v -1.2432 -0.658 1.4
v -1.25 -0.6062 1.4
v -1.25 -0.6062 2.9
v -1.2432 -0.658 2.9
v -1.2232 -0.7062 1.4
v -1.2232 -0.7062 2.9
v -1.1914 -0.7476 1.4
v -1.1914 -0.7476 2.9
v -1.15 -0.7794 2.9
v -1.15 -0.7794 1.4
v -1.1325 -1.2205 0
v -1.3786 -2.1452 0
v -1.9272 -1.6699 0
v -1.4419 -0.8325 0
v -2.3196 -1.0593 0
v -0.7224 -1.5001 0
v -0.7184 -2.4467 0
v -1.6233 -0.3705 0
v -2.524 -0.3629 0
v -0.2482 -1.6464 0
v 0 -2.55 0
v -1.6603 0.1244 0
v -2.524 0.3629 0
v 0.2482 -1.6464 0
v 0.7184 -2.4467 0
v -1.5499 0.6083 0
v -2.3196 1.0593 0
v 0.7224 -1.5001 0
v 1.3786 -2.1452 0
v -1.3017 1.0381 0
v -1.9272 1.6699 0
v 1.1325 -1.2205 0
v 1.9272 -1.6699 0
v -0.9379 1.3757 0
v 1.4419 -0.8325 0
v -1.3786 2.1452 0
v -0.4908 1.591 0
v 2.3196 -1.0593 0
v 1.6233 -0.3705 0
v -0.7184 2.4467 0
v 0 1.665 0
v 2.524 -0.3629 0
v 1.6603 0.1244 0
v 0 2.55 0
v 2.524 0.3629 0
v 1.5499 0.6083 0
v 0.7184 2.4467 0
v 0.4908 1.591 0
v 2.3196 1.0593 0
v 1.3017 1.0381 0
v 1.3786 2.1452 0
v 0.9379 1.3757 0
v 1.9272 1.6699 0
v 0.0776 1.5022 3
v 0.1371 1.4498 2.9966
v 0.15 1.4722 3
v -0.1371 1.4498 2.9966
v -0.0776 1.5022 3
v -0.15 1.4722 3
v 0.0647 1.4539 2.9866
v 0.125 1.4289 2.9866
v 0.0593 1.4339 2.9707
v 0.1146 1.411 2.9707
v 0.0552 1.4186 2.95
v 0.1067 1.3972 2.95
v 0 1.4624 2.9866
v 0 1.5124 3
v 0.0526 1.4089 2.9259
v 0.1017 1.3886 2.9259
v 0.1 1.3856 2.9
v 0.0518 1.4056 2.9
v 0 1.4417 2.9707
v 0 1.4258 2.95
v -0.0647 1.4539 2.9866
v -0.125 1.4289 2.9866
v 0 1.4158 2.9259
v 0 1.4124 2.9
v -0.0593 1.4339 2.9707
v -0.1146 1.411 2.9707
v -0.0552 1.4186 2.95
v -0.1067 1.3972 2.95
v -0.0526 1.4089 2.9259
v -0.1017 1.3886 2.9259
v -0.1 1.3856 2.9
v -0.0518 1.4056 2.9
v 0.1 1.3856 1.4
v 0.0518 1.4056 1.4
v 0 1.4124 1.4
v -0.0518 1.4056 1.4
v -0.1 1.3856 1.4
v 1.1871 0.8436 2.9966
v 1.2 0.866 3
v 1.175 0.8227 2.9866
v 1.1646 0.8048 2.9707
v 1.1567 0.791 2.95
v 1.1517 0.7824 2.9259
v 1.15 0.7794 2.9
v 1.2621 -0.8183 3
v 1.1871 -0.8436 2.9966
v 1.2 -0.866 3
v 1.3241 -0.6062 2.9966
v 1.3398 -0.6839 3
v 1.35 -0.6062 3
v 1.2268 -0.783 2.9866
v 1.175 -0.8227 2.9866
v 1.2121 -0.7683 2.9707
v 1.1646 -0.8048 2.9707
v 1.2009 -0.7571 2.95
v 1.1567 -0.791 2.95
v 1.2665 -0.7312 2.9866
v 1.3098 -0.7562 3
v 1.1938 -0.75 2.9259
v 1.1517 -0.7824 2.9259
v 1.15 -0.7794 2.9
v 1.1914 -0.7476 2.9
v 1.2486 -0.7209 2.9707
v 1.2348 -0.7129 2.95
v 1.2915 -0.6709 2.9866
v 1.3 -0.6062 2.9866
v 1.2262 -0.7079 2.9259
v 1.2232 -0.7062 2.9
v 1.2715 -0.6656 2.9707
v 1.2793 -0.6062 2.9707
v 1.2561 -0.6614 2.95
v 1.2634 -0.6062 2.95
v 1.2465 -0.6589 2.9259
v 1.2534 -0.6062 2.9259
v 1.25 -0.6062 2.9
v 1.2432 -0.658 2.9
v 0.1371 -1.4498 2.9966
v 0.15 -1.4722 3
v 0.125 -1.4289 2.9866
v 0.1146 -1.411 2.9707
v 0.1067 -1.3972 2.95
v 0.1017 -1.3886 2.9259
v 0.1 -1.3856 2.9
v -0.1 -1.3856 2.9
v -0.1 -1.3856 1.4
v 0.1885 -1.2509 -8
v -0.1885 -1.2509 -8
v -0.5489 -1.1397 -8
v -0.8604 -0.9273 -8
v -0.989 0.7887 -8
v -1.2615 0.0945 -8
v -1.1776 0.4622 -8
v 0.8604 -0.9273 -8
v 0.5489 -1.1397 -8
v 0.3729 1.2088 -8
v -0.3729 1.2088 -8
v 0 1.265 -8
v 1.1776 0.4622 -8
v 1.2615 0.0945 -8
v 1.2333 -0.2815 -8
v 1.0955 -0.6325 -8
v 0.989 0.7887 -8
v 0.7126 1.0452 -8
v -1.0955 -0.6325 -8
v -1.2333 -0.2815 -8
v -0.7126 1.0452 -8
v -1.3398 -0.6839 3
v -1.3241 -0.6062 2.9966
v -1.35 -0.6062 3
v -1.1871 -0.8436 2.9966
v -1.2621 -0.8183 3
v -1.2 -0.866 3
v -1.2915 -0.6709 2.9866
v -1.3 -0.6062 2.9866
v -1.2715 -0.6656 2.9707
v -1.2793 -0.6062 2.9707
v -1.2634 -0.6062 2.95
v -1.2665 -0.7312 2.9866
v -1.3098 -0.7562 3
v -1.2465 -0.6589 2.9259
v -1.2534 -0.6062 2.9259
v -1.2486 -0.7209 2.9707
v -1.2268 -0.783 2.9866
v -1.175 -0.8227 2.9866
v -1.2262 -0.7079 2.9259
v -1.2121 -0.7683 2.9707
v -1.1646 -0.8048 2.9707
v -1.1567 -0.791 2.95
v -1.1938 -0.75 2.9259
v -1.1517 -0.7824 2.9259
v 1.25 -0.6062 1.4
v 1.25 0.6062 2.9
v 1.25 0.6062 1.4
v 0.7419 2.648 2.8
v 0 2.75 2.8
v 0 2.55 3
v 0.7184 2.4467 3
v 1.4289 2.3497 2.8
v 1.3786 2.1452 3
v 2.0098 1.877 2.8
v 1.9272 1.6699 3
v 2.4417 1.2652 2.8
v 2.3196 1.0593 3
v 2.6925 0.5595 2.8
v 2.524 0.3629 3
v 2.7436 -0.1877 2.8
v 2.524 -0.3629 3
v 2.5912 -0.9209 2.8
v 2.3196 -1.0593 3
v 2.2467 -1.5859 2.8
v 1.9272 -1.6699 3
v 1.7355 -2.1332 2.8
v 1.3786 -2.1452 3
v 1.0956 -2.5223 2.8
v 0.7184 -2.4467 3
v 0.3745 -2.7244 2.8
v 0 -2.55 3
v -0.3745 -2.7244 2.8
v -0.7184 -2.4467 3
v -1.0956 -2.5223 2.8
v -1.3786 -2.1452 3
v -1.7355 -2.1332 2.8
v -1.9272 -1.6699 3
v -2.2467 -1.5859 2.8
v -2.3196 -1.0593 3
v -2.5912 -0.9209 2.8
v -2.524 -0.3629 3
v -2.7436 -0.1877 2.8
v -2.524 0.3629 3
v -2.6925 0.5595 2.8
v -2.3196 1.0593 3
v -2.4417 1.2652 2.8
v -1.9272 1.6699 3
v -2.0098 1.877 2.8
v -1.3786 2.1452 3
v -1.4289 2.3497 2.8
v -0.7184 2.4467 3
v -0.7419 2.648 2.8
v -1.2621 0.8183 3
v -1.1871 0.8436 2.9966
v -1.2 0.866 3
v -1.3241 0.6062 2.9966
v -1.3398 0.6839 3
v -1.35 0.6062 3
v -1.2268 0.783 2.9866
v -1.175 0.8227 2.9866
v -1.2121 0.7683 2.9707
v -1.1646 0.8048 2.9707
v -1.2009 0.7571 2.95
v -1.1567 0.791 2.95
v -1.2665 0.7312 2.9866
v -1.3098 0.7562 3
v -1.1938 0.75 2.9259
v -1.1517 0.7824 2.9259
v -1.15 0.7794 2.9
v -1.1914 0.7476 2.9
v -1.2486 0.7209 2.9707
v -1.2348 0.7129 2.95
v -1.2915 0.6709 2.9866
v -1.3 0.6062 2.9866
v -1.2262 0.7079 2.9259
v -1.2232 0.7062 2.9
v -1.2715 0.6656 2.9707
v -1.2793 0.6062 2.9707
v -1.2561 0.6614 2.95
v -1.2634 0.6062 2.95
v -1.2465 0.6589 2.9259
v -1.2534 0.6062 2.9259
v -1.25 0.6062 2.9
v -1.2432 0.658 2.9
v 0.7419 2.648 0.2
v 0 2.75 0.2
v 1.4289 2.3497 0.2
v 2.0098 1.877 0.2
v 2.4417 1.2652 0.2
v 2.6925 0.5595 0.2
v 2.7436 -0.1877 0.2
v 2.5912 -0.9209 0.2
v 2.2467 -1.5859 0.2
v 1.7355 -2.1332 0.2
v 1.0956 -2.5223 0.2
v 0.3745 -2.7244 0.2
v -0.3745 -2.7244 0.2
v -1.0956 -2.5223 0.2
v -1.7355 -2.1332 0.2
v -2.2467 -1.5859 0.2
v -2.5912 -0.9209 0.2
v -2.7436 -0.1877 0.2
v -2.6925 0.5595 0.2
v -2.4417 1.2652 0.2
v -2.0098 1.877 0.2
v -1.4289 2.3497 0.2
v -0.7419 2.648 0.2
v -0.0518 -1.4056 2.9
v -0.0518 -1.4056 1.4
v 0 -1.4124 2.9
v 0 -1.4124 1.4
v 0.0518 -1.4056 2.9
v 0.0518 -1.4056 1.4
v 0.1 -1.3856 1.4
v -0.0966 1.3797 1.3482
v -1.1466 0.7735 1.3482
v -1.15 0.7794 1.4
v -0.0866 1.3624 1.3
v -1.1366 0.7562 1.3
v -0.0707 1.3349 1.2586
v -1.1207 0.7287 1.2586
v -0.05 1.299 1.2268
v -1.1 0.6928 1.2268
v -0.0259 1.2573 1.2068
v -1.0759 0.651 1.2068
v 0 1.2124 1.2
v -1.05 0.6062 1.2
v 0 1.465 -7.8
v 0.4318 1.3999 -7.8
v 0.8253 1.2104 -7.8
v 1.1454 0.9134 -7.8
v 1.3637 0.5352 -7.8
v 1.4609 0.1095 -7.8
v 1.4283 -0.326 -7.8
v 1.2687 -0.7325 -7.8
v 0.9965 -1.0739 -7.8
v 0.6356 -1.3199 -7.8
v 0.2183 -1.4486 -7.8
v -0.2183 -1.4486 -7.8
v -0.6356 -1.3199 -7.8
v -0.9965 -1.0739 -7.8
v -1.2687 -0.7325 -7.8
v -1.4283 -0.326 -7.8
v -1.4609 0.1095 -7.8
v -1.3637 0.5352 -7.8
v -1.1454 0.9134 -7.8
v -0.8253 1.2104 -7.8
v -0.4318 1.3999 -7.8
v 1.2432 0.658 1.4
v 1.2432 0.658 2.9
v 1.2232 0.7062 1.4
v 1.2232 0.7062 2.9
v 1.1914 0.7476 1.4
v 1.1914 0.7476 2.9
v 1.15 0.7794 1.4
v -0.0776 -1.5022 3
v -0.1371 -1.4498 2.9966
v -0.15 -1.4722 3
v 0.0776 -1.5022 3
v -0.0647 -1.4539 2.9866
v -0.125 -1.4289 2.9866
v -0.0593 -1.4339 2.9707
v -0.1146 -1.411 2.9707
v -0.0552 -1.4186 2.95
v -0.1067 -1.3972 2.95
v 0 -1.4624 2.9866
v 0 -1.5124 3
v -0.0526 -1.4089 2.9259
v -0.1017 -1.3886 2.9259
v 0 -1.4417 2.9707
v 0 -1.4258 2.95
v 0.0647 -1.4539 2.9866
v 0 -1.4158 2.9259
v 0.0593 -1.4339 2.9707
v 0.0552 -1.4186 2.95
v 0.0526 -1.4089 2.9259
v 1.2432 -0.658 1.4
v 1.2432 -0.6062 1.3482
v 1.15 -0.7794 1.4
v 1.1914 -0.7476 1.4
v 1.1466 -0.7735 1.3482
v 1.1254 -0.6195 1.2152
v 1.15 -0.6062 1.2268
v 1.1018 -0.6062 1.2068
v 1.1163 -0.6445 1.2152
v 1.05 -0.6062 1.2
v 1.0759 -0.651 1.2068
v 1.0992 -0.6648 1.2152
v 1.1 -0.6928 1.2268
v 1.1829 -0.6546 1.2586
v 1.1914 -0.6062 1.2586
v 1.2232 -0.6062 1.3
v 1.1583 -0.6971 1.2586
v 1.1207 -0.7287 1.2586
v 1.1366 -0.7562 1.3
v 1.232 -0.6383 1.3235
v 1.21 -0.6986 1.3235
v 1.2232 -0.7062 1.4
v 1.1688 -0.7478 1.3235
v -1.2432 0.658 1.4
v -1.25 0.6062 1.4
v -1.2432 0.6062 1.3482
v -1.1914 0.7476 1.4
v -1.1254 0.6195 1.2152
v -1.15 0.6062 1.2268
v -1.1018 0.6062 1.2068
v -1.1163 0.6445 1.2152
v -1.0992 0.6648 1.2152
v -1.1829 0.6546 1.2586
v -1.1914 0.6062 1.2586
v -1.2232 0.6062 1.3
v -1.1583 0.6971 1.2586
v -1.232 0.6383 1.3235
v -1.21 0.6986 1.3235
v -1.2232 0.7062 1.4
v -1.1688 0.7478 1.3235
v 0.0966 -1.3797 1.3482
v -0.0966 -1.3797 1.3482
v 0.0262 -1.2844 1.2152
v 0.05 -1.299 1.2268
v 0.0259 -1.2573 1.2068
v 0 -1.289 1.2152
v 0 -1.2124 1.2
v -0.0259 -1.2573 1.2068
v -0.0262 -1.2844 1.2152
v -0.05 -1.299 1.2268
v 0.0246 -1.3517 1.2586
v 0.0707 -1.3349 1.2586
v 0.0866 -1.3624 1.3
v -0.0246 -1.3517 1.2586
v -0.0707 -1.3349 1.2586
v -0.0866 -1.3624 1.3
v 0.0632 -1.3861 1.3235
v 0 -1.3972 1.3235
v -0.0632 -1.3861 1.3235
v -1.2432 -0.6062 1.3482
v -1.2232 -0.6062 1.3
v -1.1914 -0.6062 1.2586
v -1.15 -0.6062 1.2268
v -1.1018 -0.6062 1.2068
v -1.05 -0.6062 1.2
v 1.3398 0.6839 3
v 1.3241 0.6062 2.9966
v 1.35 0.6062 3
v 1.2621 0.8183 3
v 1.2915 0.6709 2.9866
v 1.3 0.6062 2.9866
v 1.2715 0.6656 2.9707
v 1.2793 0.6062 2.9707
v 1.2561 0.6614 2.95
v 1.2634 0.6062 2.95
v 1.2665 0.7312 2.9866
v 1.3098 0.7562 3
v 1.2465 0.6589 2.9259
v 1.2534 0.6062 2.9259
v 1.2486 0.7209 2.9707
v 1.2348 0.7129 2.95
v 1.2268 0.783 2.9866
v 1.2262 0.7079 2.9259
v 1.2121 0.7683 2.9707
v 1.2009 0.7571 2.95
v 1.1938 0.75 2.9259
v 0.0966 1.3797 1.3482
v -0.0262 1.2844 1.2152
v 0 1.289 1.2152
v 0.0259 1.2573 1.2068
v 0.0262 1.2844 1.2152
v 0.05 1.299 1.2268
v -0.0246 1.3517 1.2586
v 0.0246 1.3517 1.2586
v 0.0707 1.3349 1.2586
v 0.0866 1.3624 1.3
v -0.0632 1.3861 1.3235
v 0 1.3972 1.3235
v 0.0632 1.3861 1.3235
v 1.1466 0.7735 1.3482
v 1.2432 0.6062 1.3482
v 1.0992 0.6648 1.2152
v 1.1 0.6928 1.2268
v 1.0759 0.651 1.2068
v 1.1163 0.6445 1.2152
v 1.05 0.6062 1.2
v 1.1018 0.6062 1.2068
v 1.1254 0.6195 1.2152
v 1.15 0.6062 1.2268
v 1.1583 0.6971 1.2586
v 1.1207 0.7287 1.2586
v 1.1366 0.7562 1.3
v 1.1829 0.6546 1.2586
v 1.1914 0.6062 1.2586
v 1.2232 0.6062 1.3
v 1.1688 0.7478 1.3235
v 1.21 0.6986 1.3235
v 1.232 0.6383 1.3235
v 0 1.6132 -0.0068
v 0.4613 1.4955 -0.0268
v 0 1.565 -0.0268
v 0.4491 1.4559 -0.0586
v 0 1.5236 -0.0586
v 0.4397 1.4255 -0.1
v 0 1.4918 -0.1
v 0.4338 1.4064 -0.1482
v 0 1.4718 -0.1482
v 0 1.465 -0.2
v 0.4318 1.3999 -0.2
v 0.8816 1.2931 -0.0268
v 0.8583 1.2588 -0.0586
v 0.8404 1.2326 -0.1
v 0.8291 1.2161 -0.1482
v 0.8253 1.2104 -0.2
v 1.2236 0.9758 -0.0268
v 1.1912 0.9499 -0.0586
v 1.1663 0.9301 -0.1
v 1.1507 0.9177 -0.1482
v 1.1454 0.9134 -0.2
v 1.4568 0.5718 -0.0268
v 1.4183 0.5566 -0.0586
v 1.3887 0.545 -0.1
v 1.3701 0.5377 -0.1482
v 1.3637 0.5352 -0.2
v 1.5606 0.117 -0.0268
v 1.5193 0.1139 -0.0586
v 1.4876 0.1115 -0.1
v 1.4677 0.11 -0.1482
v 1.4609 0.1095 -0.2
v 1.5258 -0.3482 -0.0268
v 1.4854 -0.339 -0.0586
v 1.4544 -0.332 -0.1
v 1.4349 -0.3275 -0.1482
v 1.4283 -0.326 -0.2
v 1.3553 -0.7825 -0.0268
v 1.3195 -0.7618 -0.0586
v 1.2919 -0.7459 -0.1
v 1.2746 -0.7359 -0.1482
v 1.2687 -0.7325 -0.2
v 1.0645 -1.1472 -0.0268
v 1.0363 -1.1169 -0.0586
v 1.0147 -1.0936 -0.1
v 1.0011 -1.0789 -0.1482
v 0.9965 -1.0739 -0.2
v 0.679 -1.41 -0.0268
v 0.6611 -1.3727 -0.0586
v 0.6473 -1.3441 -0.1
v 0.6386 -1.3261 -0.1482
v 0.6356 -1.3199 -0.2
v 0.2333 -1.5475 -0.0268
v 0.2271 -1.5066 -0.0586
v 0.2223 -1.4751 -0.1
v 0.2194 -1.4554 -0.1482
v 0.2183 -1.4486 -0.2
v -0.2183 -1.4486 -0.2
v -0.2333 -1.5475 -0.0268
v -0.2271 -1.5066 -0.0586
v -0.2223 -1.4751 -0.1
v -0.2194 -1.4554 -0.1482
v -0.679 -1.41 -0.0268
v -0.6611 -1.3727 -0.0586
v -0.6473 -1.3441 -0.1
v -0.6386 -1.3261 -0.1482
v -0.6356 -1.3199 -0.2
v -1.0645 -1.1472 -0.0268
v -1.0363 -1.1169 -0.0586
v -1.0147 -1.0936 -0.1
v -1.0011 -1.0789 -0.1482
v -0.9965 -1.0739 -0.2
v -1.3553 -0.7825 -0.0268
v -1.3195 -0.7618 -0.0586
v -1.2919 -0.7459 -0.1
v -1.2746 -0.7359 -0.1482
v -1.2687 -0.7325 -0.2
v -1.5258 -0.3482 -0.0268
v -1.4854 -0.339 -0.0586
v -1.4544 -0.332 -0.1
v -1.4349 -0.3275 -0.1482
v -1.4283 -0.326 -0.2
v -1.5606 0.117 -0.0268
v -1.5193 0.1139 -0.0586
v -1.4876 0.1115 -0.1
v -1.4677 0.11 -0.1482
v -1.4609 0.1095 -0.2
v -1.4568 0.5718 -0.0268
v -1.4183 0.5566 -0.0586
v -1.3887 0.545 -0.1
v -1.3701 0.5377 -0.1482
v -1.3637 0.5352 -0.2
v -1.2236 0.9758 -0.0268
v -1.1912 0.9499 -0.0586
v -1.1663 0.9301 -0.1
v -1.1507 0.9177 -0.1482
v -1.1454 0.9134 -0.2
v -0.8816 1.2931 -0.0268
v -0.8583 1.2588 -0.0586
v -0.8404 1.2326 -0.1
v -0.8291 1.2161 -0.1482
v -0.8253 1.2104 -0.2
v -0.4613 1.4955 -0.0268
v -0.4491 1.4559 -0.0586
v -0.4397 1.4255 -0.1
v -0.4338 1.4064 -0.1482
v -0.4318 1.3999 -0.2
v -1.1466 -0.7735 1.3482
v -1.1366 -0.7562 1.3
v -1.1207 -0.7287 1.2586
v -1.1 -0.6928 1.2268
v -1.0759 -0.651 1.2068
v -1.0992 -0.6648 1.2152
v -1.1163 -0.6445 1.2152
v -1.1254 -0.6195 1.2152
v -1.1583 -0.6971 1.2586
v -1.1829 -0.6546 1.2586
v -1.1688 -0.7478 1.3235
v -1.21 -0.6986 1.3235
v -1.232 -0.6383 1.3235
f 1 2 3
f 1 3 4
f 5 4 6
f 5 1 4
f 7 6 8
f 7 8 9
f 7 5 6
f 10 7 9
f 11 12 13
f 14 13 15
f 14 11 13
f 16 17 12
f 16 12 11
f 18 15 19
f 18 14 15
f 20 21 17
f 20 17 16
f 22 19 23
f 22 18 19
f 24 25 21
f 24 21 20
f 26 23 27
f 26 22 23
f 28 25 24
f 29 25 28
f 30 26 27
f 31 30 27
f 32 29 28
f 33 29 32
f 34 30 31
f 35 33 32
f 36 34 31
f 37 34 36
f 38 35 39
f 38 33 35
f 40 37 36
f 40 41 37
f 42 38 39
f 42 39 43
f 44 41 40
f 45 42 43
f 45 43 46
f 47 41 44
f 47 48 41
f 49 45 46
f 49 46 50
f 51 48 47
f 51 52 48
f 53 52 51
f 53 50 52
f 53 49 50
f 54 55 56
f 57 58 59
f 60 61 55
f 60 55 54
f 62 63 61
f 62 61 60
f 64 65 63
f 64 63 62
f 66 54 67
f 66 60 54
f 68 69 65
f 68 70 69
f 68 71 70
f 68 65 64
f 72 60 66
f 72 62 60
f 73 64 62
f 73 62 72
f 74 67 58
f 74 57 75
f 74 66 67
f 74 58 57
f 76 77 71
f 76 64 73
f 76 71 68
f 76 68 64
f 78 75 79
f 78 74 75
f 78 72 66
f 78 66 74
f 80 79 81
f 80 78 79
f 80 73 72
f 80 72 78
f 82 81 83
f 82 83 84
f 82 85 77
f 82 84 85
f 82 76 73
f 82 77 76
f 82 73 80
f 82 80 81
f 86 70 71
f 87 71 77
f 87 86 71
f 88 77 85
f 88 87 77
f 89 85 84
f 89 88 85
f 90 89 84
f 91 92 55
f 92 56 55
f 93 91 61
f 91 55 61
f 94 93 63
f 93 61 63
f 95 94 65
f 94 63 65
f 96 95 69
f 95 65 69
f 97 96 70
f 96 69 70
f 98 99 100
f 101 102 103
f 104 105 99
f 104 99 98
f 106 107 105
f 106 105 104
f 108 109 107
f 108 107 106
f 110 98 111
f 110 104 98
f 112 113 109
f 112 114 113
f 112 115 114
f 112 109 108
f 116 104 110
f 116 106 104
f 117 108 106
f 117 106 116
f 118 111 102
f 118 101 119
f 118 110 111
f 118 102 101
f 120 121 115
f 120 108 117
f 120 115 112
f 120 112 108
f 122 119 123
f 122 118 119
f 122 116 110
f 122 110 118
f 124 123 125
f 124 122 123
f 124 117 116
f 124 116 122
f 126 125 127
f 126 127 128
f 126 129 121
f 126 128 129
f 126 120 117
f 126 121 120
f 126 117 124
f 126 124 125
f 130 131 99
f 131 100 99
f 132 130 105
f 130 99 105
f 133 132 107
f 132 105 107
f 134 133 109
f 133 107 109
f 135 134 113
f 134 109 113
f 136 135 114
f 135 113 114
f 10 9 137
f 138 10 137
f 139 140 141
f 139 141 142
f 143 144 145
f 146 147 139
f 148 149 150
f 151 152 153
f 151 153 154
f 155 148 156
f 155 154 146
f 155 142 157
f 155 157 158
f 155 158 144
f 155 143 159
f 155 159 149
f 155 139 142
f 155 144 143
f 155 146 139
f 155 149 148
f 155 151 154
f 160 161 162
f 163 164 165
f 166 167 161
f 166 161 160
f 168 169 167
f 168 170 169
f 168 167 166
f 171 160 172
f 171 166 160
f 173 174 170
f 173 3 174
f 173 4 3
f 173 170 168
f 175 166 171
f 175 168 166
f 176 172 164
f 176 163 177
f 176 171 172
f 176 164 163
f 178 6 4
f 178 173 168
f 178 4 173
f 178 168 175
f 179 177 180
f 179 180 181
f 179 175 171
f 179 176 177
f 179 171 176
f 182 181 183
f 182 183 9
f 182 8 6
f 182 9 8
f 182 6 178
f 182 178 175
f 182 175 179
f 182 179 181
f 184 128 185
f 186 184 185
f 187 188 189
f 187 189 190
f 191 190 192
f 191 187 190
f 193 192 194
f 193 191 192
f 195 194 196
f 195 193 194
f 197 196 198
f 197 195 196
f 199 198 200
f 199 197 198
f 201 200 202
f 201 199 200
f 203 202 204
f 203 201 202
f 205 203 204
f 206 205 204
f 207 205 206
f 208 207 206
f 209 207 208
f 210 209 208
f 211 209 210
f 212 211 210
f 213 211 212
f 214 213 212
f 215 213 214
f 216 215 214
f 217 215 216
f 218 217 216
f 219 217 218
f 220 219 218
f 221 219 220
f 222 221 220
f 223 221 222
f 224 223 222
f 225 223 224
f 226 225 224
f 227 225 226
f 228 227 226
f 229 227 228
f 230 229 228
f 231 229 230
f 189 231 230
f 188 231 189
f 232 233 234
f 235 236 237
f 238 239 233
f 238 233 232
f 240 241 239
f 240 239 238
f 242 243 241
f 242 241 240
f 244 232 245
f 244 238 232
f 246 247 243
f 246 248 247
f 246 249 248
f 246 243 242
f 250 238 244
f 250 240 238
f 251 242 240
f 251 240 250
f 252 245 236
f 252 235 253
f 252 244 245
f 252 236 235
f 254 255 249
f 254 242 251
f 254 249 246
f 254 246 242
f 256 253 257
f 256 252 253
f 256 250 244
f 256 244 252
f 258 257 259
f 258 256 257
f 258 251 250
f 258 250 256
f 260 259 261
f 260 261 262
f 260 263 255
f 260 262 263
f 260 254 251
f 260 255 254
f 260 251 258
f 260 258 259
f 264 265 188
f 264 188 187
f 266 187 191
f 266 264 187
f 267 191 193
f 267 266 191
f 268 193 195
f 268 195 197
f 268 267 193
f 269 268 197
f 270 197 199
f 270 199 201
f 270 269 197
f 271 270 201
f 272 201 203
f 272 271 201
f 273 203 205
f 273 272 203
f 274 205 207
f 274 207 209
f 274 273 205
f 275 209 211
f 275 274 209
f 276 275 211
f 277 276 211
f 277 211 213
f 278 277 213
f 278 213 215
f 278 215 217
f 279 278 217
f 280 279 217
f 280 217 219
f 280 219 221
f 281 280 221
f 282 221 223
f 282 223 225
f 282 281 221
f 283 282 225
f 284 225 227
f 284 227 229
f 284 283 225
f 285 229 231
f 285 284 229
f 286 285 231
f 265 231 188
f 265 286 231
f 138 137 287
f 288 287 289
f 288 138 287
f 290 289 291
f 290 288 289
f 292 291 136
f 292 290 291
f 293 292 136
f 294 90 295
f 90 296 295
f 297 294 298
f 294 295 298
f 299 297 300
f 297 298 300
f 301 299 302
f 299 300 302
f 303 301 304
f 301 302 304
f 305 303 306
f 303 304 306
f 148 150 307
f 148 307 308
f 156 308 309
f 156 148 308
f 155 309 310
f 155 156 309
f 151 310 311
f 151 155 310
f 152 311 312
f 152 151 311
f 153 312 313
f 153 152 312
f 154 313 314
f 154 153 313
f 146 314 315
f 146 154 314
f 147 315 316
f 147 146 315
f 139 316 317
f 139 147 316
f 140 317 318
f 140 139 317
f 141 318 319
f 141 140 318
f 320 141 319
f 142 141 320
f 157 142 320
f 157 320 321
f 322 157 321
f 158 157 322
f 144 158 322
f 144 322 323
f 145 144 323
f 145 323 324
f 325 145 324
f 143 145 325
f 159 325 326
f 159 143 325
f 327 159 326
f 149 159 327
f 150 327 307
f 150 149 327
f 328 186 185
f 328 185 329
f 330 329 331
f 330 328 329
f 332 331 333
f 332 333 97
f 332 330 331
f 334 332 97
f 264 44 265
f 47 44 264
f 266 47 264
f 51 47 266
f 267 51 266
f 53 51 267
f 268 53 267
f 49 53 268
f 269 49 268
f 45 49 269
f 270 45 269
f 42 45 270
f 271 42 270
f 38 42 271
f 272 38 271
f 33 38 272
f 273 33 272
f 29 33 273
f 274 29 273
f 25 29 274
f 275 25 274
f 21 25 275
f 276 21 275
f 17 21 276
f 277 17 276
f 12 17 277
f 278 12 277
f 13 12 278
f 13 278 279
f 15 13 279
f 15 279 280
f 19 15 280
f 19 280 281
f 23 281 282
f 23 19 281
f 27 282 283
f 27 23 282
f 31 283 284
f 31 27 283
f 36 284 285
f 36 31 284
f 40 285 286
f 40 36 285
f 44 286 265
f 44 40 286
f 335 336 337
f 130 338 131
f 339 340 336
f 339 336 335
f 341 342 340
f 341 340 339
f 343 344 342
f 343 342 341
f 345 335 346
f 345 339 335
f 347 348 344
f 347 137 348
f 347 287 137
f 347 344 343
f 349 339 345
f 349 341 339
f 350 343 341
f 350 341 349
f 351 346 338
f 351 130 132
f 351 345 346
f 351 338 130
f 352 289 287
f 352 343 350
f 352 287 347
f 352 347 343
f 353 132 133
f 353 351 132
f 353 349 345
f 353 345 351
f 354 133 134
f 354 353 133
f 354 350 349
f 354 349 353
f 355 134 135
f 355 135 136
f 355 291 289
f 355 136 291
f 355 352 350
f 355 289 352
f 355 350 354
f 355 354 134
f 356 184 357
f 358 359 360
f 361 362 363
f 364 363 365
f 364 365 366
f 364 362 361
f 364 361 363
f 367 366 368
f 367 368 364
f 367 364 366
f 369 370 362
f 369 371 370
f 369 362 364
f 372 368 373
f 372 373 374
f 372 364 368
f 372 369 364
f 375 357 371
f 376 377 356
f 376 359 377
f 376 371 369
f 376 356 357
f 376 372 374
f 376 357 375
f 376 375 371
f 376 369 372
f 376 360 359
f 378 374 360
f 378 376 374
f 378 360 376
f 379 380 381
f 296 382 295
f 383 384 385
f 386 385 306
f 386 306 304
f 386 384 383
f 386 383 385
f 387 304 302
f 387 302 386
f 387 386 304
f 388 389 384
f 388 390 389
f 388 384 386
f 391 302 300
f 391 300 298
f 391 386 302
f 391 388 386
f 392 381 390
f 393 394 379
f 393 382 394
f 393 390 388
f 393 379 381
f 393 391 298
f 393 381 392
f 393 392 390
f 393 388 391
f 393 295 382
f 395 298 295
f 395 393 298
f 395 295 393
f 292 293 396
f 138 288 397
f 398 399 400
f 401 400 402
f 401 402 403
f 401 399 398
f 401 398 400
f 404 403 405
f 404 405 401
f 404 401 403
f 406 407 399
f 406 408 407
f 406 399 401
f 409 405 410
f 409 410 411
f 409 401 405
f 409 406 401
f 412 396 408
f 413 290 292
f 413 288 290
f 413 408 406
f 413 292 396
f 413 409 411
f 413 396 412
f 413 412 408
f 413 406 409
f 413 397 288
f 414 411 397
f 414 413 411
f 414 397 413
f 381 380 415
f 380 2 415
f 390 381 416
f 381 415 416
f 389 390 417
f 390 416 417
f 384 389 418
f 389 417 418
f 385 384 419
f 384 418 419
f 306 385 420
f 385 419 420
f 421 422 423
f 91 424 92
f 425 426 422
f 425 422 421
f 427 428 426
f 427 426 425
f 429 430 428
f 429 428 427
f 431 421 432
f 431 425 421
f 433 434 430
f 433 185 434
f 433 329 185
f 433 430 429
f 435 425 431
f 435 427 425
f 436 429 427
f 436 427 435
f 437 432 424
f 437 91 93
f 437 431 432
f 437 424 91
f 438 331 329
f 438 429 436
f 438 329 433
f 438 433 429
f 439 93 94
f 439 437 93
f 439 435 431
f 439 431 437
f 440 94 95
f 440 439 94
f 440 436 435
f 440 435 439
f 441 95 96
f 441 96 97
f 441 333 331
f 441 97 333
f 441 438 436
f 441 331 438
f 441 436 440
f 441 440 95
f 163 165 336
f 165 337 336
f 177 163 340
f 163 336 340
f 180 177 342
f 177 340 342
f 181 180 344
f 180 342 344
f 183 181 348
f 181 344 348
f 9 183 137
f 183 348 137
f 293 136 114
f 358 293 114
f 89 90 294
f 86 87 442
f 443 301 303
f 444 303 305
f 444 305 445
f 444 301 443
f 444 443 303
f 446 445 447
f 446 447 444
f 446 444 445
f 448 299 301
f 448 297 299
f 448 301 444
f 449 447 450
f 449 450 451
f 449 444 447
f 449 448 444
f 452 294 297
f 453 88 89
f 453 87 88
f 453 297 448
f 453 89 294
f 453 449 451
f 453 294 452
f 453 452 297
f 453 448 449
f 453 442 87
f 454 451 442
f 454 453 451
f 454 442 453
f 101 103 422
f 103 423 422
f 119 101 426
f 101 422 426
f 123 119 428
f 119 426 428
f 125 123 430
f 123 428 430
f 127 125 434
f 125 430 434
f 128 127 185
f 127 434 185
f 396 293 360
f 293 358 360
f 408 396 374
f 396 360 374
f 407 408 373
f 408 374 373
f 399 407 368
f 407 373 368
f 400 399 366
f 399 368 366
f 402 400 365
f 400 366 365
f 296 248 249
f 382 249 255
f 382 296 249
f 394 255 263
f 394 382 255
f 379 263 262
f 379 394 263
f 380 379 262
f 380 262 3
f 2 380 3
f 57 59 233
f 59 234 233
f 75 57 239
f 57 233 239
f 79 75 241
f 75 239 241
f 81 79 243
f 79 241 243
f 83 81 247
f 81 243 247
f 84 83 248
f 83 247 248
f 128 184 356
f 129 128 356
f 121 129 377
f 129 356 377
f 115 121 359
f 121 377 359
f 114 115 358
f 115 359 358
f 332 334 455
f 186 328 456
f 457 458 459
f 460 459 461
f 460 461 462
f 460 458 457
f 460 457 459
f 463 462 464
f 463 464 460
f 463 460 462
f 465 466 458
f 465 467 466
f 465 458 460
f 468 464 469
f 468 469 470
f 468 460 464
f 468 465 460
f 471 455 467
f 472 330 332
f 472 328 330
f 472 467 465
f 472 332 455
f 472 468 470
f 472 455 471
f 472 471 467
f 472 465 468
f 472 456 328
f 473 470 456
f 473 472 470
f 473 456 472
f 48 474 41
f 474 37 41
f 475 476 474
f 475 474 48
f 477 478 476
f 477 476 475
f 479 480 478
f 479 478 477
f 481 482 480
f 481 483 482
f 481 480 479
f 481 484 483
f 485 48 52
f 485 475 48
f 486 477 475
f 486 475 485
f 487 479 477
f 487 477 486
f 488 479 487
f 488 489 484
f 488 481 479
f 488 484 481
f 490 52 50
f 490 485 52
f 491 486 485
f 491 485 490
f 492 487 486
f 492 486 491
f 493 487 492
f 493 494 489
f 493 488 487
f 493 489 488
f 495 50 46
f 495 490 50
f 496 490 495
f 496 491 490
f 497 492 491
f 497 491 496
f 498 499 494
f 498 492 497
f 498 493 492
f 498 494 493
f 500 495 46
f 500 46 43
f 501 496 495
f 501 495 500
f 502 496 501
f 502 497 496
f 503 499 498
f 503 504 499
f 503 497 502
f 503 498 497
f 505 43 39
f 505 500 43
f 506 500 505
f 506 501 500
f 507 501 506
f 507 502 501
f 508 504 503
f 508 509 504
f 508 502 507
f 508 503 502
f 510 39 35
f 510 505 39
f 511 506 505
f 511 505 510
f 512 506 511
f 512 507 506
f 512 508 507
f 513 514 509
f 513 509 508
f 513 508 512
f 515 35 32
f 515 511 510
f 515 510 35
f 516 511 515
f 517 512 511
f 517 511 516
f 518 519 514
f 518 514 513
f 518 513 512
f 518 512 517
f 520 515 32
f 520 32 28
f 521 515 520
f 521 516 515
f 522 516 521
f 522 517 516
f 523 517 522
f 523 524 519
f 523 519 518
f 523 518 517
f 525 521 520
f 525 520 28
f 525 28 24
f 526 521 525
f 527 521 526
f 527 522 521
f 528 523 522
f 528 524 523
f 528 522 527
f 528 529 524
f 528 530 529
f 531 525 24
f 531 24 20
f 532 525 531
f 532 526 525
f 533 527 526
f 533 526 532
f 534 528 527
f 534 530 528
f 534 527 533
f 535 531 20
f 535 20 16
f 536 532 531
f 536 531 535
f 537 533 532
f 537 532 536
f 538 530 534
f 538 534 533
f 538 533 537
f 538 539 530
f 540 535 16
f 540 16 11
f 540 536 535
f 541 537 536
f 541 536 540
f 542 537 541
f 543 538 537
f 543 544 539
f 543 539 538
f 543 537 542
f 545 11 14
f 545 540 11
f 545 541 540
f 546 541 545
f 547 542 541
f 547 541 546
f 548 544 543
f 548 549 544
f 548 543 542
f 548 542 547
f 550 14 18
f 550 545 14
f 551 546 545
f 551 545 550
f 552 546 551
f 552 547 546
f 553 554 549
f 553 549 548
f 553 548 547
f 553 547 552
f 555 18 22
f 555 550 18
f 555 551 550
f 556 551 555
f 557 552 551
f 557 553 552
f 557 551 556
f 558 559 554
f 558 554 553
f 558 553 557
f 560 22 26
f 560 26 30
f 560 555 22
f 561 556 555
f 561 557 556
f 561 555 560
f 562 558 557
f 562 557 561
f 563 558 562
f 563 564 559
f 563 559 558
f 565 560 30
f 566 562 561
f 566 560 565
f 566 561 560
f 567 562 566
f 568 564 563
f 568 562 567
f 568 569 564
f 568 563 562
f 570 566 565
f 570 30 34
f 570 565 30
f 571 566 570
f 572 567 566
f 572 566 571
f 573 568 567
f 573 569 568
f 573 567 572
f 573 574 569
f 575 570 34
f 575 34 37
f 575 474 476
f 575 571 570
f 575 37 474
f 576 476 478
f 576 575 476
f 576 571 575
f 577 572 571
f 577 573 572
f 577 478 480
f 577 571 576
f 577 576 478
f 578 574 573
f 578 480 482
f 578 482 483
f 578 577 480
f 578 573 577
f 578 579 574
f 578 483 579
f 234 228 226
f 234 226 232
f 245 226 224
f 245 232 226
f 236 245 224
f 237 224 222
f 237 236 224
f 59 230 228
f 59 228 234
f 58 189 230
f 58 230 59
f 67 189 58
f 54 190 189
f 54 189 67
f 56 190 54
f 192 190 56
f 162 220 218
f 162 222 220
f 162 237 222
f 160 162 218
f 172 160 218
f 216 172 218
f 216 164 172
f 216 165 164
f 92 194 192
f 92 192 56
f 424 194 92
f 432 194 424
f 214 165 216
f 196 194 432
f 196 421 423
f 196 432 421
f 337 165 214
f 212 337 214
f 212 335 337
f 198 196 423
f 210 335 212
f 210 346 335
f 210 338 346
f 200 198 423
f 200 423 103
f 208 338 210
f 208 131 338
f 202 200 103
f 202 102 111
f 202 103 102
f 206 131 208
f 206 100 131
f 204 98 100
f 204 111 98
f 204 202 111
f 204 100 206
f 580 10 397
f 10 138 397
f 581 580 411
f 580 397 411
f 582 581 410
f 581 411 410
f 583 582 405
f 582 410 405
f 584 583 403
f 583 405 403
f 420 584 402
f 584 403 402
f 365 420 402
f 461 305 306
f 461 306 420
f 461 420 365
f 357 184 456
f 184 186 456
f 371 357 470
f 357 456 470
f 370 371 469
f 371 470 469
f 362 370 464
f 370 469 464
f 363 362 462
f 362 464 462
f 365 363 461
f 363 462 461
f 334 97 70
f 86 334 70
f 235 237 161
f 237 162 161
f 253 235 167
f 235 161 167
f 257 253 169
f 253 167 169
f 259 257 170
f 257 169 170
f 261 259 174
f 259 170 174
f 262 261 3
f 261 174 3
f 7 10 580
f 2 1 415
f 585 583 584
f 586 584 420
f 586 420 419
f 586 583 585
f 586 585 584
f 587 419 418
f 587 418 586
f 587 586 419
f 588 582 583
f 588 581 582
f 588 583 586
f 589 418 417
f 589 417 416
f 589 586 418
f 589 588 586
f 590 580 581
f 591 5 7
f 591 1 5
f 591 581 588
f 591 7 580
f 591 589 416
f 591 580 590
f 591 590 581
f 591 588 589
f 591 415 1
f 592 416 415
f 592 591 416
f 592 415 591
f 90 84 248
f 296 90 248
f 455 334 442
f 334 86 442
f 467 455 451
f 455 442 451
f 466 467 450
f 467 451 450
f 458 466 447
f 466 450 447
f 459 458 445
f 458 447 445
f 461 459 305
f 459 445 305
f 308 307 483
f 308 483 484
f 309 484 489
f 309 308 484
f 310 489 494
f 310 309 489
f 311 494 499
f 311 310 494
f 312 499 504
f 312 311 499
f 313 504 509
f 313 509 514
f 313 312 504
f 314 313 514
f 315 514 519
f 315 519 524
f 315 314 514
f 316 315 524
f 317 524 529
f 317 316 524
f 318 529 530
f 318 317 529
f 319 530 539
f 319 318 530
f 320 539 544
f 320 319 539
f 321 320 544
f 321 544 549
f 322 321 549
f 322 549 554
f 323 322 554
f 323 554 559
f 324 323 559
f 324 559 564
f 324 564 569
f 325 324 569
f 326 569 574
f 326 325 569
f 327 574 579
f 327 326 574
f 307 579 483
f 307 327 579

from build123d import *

# Parameters (mm, degrees)
SCHNITT_LINEAR_AUSTRAGEN1_DEPTH = 1.8
FASE1_SIZE                      = 0.2
VERRUNDUNG1_R                   = 0.2
VERRUNDUNG2_R                   = 0.1


with BuildPart() as part:
    # Skizze1 → Rotation1 (revolve)
    with BuildSketch(Plane(origin=(0, 0, 0), x_dir=(0, 0, -1), z_dir=(1, 0, 0))):
        Polygon((-3, 0), (-3, 2.75), (0, 2.75), (0, 1.465), (8, 1.465), (8, 0), align=None)
    revolve(axis=Axis((0, 0, 21.919879518), (0, 0, -1)))

    # Skizze2 → Schnitt-Linear austragen1 (cut)
    with BuildSketch(Plane.XY.offset(3)):
        Polygon((1.25, -0.721687836), (1.25, 0.721687836), (0, 1.443375673), (-1.25, 0.721687836), (-1.25, -0.721687836), (0, -1.443375673), align=None)
    extrude(amount=-SCHNITT_LINEAR_AUSTRAGEN1_DEPTH, mode=Mode.SUBTRACT)

    # Fase1
    fase1_edges = [part.edges().sort_by_distance(p)[0] for p in [
        (0, -1.465, -8),
        (0, -2.75, 0),
        (0, -2.75, 3),
    ]]
    chamfer(fase1_edges, length=FASE1_SIZE)

    # Verrundung1
    verrundung1_edges = [part.edges().sort_by_distance(p)[0] for p in [
        (0.625, -1.082531755, 1.2),
        (1.25, -0.721687836, 2.1),
        (-0.625, -1.082531755, 1.2),
        (0, -1.443375673, 2.1),
        (-1.25, 0, 1.2),
        (-1.25, -0.721687836, 2.1),
        (-0.625, 1.082531755, 1.2),
        (-1.25, 0.721687836, 2.1),
        (0.625, 1.082531755, 1.2),
        (0, 1.443375673, 2.1),
        (1.25, 0, 1.2),
        (1.25, 0.721687836, 2.1),
        (0, -1.465, 0),
    ]]
    fillet(verrundung1_edges, radius=VERRUNDUNG1_R)

    # Verrundung2
    verrundung2_edges = [part.edges().sort_by_distance(p)[0] for p in [
        (-0.625, -1.082531755, 3),
        (-1.25, 0, 3),
        (-0.625, 1.082531755, 3),
        (0.625, 1.082531755, 3),
        (1.25, 0, 3),
        (0.625, -1.082531755, 3),
        (-1.223205081, -0.706217783, 3),
        (0, -1.412435565, 3),
        (1.223205081, -0.706217783, 3),
        (1.223205081, 0.706217783, 3),
        (0, 1.412435565, 3),
        (-1.223205081, 0.706217783, 3),
    ]]
    fillet(verrundung2_edges, radius=VERRUNDUNG2_R)


solid = part.part
